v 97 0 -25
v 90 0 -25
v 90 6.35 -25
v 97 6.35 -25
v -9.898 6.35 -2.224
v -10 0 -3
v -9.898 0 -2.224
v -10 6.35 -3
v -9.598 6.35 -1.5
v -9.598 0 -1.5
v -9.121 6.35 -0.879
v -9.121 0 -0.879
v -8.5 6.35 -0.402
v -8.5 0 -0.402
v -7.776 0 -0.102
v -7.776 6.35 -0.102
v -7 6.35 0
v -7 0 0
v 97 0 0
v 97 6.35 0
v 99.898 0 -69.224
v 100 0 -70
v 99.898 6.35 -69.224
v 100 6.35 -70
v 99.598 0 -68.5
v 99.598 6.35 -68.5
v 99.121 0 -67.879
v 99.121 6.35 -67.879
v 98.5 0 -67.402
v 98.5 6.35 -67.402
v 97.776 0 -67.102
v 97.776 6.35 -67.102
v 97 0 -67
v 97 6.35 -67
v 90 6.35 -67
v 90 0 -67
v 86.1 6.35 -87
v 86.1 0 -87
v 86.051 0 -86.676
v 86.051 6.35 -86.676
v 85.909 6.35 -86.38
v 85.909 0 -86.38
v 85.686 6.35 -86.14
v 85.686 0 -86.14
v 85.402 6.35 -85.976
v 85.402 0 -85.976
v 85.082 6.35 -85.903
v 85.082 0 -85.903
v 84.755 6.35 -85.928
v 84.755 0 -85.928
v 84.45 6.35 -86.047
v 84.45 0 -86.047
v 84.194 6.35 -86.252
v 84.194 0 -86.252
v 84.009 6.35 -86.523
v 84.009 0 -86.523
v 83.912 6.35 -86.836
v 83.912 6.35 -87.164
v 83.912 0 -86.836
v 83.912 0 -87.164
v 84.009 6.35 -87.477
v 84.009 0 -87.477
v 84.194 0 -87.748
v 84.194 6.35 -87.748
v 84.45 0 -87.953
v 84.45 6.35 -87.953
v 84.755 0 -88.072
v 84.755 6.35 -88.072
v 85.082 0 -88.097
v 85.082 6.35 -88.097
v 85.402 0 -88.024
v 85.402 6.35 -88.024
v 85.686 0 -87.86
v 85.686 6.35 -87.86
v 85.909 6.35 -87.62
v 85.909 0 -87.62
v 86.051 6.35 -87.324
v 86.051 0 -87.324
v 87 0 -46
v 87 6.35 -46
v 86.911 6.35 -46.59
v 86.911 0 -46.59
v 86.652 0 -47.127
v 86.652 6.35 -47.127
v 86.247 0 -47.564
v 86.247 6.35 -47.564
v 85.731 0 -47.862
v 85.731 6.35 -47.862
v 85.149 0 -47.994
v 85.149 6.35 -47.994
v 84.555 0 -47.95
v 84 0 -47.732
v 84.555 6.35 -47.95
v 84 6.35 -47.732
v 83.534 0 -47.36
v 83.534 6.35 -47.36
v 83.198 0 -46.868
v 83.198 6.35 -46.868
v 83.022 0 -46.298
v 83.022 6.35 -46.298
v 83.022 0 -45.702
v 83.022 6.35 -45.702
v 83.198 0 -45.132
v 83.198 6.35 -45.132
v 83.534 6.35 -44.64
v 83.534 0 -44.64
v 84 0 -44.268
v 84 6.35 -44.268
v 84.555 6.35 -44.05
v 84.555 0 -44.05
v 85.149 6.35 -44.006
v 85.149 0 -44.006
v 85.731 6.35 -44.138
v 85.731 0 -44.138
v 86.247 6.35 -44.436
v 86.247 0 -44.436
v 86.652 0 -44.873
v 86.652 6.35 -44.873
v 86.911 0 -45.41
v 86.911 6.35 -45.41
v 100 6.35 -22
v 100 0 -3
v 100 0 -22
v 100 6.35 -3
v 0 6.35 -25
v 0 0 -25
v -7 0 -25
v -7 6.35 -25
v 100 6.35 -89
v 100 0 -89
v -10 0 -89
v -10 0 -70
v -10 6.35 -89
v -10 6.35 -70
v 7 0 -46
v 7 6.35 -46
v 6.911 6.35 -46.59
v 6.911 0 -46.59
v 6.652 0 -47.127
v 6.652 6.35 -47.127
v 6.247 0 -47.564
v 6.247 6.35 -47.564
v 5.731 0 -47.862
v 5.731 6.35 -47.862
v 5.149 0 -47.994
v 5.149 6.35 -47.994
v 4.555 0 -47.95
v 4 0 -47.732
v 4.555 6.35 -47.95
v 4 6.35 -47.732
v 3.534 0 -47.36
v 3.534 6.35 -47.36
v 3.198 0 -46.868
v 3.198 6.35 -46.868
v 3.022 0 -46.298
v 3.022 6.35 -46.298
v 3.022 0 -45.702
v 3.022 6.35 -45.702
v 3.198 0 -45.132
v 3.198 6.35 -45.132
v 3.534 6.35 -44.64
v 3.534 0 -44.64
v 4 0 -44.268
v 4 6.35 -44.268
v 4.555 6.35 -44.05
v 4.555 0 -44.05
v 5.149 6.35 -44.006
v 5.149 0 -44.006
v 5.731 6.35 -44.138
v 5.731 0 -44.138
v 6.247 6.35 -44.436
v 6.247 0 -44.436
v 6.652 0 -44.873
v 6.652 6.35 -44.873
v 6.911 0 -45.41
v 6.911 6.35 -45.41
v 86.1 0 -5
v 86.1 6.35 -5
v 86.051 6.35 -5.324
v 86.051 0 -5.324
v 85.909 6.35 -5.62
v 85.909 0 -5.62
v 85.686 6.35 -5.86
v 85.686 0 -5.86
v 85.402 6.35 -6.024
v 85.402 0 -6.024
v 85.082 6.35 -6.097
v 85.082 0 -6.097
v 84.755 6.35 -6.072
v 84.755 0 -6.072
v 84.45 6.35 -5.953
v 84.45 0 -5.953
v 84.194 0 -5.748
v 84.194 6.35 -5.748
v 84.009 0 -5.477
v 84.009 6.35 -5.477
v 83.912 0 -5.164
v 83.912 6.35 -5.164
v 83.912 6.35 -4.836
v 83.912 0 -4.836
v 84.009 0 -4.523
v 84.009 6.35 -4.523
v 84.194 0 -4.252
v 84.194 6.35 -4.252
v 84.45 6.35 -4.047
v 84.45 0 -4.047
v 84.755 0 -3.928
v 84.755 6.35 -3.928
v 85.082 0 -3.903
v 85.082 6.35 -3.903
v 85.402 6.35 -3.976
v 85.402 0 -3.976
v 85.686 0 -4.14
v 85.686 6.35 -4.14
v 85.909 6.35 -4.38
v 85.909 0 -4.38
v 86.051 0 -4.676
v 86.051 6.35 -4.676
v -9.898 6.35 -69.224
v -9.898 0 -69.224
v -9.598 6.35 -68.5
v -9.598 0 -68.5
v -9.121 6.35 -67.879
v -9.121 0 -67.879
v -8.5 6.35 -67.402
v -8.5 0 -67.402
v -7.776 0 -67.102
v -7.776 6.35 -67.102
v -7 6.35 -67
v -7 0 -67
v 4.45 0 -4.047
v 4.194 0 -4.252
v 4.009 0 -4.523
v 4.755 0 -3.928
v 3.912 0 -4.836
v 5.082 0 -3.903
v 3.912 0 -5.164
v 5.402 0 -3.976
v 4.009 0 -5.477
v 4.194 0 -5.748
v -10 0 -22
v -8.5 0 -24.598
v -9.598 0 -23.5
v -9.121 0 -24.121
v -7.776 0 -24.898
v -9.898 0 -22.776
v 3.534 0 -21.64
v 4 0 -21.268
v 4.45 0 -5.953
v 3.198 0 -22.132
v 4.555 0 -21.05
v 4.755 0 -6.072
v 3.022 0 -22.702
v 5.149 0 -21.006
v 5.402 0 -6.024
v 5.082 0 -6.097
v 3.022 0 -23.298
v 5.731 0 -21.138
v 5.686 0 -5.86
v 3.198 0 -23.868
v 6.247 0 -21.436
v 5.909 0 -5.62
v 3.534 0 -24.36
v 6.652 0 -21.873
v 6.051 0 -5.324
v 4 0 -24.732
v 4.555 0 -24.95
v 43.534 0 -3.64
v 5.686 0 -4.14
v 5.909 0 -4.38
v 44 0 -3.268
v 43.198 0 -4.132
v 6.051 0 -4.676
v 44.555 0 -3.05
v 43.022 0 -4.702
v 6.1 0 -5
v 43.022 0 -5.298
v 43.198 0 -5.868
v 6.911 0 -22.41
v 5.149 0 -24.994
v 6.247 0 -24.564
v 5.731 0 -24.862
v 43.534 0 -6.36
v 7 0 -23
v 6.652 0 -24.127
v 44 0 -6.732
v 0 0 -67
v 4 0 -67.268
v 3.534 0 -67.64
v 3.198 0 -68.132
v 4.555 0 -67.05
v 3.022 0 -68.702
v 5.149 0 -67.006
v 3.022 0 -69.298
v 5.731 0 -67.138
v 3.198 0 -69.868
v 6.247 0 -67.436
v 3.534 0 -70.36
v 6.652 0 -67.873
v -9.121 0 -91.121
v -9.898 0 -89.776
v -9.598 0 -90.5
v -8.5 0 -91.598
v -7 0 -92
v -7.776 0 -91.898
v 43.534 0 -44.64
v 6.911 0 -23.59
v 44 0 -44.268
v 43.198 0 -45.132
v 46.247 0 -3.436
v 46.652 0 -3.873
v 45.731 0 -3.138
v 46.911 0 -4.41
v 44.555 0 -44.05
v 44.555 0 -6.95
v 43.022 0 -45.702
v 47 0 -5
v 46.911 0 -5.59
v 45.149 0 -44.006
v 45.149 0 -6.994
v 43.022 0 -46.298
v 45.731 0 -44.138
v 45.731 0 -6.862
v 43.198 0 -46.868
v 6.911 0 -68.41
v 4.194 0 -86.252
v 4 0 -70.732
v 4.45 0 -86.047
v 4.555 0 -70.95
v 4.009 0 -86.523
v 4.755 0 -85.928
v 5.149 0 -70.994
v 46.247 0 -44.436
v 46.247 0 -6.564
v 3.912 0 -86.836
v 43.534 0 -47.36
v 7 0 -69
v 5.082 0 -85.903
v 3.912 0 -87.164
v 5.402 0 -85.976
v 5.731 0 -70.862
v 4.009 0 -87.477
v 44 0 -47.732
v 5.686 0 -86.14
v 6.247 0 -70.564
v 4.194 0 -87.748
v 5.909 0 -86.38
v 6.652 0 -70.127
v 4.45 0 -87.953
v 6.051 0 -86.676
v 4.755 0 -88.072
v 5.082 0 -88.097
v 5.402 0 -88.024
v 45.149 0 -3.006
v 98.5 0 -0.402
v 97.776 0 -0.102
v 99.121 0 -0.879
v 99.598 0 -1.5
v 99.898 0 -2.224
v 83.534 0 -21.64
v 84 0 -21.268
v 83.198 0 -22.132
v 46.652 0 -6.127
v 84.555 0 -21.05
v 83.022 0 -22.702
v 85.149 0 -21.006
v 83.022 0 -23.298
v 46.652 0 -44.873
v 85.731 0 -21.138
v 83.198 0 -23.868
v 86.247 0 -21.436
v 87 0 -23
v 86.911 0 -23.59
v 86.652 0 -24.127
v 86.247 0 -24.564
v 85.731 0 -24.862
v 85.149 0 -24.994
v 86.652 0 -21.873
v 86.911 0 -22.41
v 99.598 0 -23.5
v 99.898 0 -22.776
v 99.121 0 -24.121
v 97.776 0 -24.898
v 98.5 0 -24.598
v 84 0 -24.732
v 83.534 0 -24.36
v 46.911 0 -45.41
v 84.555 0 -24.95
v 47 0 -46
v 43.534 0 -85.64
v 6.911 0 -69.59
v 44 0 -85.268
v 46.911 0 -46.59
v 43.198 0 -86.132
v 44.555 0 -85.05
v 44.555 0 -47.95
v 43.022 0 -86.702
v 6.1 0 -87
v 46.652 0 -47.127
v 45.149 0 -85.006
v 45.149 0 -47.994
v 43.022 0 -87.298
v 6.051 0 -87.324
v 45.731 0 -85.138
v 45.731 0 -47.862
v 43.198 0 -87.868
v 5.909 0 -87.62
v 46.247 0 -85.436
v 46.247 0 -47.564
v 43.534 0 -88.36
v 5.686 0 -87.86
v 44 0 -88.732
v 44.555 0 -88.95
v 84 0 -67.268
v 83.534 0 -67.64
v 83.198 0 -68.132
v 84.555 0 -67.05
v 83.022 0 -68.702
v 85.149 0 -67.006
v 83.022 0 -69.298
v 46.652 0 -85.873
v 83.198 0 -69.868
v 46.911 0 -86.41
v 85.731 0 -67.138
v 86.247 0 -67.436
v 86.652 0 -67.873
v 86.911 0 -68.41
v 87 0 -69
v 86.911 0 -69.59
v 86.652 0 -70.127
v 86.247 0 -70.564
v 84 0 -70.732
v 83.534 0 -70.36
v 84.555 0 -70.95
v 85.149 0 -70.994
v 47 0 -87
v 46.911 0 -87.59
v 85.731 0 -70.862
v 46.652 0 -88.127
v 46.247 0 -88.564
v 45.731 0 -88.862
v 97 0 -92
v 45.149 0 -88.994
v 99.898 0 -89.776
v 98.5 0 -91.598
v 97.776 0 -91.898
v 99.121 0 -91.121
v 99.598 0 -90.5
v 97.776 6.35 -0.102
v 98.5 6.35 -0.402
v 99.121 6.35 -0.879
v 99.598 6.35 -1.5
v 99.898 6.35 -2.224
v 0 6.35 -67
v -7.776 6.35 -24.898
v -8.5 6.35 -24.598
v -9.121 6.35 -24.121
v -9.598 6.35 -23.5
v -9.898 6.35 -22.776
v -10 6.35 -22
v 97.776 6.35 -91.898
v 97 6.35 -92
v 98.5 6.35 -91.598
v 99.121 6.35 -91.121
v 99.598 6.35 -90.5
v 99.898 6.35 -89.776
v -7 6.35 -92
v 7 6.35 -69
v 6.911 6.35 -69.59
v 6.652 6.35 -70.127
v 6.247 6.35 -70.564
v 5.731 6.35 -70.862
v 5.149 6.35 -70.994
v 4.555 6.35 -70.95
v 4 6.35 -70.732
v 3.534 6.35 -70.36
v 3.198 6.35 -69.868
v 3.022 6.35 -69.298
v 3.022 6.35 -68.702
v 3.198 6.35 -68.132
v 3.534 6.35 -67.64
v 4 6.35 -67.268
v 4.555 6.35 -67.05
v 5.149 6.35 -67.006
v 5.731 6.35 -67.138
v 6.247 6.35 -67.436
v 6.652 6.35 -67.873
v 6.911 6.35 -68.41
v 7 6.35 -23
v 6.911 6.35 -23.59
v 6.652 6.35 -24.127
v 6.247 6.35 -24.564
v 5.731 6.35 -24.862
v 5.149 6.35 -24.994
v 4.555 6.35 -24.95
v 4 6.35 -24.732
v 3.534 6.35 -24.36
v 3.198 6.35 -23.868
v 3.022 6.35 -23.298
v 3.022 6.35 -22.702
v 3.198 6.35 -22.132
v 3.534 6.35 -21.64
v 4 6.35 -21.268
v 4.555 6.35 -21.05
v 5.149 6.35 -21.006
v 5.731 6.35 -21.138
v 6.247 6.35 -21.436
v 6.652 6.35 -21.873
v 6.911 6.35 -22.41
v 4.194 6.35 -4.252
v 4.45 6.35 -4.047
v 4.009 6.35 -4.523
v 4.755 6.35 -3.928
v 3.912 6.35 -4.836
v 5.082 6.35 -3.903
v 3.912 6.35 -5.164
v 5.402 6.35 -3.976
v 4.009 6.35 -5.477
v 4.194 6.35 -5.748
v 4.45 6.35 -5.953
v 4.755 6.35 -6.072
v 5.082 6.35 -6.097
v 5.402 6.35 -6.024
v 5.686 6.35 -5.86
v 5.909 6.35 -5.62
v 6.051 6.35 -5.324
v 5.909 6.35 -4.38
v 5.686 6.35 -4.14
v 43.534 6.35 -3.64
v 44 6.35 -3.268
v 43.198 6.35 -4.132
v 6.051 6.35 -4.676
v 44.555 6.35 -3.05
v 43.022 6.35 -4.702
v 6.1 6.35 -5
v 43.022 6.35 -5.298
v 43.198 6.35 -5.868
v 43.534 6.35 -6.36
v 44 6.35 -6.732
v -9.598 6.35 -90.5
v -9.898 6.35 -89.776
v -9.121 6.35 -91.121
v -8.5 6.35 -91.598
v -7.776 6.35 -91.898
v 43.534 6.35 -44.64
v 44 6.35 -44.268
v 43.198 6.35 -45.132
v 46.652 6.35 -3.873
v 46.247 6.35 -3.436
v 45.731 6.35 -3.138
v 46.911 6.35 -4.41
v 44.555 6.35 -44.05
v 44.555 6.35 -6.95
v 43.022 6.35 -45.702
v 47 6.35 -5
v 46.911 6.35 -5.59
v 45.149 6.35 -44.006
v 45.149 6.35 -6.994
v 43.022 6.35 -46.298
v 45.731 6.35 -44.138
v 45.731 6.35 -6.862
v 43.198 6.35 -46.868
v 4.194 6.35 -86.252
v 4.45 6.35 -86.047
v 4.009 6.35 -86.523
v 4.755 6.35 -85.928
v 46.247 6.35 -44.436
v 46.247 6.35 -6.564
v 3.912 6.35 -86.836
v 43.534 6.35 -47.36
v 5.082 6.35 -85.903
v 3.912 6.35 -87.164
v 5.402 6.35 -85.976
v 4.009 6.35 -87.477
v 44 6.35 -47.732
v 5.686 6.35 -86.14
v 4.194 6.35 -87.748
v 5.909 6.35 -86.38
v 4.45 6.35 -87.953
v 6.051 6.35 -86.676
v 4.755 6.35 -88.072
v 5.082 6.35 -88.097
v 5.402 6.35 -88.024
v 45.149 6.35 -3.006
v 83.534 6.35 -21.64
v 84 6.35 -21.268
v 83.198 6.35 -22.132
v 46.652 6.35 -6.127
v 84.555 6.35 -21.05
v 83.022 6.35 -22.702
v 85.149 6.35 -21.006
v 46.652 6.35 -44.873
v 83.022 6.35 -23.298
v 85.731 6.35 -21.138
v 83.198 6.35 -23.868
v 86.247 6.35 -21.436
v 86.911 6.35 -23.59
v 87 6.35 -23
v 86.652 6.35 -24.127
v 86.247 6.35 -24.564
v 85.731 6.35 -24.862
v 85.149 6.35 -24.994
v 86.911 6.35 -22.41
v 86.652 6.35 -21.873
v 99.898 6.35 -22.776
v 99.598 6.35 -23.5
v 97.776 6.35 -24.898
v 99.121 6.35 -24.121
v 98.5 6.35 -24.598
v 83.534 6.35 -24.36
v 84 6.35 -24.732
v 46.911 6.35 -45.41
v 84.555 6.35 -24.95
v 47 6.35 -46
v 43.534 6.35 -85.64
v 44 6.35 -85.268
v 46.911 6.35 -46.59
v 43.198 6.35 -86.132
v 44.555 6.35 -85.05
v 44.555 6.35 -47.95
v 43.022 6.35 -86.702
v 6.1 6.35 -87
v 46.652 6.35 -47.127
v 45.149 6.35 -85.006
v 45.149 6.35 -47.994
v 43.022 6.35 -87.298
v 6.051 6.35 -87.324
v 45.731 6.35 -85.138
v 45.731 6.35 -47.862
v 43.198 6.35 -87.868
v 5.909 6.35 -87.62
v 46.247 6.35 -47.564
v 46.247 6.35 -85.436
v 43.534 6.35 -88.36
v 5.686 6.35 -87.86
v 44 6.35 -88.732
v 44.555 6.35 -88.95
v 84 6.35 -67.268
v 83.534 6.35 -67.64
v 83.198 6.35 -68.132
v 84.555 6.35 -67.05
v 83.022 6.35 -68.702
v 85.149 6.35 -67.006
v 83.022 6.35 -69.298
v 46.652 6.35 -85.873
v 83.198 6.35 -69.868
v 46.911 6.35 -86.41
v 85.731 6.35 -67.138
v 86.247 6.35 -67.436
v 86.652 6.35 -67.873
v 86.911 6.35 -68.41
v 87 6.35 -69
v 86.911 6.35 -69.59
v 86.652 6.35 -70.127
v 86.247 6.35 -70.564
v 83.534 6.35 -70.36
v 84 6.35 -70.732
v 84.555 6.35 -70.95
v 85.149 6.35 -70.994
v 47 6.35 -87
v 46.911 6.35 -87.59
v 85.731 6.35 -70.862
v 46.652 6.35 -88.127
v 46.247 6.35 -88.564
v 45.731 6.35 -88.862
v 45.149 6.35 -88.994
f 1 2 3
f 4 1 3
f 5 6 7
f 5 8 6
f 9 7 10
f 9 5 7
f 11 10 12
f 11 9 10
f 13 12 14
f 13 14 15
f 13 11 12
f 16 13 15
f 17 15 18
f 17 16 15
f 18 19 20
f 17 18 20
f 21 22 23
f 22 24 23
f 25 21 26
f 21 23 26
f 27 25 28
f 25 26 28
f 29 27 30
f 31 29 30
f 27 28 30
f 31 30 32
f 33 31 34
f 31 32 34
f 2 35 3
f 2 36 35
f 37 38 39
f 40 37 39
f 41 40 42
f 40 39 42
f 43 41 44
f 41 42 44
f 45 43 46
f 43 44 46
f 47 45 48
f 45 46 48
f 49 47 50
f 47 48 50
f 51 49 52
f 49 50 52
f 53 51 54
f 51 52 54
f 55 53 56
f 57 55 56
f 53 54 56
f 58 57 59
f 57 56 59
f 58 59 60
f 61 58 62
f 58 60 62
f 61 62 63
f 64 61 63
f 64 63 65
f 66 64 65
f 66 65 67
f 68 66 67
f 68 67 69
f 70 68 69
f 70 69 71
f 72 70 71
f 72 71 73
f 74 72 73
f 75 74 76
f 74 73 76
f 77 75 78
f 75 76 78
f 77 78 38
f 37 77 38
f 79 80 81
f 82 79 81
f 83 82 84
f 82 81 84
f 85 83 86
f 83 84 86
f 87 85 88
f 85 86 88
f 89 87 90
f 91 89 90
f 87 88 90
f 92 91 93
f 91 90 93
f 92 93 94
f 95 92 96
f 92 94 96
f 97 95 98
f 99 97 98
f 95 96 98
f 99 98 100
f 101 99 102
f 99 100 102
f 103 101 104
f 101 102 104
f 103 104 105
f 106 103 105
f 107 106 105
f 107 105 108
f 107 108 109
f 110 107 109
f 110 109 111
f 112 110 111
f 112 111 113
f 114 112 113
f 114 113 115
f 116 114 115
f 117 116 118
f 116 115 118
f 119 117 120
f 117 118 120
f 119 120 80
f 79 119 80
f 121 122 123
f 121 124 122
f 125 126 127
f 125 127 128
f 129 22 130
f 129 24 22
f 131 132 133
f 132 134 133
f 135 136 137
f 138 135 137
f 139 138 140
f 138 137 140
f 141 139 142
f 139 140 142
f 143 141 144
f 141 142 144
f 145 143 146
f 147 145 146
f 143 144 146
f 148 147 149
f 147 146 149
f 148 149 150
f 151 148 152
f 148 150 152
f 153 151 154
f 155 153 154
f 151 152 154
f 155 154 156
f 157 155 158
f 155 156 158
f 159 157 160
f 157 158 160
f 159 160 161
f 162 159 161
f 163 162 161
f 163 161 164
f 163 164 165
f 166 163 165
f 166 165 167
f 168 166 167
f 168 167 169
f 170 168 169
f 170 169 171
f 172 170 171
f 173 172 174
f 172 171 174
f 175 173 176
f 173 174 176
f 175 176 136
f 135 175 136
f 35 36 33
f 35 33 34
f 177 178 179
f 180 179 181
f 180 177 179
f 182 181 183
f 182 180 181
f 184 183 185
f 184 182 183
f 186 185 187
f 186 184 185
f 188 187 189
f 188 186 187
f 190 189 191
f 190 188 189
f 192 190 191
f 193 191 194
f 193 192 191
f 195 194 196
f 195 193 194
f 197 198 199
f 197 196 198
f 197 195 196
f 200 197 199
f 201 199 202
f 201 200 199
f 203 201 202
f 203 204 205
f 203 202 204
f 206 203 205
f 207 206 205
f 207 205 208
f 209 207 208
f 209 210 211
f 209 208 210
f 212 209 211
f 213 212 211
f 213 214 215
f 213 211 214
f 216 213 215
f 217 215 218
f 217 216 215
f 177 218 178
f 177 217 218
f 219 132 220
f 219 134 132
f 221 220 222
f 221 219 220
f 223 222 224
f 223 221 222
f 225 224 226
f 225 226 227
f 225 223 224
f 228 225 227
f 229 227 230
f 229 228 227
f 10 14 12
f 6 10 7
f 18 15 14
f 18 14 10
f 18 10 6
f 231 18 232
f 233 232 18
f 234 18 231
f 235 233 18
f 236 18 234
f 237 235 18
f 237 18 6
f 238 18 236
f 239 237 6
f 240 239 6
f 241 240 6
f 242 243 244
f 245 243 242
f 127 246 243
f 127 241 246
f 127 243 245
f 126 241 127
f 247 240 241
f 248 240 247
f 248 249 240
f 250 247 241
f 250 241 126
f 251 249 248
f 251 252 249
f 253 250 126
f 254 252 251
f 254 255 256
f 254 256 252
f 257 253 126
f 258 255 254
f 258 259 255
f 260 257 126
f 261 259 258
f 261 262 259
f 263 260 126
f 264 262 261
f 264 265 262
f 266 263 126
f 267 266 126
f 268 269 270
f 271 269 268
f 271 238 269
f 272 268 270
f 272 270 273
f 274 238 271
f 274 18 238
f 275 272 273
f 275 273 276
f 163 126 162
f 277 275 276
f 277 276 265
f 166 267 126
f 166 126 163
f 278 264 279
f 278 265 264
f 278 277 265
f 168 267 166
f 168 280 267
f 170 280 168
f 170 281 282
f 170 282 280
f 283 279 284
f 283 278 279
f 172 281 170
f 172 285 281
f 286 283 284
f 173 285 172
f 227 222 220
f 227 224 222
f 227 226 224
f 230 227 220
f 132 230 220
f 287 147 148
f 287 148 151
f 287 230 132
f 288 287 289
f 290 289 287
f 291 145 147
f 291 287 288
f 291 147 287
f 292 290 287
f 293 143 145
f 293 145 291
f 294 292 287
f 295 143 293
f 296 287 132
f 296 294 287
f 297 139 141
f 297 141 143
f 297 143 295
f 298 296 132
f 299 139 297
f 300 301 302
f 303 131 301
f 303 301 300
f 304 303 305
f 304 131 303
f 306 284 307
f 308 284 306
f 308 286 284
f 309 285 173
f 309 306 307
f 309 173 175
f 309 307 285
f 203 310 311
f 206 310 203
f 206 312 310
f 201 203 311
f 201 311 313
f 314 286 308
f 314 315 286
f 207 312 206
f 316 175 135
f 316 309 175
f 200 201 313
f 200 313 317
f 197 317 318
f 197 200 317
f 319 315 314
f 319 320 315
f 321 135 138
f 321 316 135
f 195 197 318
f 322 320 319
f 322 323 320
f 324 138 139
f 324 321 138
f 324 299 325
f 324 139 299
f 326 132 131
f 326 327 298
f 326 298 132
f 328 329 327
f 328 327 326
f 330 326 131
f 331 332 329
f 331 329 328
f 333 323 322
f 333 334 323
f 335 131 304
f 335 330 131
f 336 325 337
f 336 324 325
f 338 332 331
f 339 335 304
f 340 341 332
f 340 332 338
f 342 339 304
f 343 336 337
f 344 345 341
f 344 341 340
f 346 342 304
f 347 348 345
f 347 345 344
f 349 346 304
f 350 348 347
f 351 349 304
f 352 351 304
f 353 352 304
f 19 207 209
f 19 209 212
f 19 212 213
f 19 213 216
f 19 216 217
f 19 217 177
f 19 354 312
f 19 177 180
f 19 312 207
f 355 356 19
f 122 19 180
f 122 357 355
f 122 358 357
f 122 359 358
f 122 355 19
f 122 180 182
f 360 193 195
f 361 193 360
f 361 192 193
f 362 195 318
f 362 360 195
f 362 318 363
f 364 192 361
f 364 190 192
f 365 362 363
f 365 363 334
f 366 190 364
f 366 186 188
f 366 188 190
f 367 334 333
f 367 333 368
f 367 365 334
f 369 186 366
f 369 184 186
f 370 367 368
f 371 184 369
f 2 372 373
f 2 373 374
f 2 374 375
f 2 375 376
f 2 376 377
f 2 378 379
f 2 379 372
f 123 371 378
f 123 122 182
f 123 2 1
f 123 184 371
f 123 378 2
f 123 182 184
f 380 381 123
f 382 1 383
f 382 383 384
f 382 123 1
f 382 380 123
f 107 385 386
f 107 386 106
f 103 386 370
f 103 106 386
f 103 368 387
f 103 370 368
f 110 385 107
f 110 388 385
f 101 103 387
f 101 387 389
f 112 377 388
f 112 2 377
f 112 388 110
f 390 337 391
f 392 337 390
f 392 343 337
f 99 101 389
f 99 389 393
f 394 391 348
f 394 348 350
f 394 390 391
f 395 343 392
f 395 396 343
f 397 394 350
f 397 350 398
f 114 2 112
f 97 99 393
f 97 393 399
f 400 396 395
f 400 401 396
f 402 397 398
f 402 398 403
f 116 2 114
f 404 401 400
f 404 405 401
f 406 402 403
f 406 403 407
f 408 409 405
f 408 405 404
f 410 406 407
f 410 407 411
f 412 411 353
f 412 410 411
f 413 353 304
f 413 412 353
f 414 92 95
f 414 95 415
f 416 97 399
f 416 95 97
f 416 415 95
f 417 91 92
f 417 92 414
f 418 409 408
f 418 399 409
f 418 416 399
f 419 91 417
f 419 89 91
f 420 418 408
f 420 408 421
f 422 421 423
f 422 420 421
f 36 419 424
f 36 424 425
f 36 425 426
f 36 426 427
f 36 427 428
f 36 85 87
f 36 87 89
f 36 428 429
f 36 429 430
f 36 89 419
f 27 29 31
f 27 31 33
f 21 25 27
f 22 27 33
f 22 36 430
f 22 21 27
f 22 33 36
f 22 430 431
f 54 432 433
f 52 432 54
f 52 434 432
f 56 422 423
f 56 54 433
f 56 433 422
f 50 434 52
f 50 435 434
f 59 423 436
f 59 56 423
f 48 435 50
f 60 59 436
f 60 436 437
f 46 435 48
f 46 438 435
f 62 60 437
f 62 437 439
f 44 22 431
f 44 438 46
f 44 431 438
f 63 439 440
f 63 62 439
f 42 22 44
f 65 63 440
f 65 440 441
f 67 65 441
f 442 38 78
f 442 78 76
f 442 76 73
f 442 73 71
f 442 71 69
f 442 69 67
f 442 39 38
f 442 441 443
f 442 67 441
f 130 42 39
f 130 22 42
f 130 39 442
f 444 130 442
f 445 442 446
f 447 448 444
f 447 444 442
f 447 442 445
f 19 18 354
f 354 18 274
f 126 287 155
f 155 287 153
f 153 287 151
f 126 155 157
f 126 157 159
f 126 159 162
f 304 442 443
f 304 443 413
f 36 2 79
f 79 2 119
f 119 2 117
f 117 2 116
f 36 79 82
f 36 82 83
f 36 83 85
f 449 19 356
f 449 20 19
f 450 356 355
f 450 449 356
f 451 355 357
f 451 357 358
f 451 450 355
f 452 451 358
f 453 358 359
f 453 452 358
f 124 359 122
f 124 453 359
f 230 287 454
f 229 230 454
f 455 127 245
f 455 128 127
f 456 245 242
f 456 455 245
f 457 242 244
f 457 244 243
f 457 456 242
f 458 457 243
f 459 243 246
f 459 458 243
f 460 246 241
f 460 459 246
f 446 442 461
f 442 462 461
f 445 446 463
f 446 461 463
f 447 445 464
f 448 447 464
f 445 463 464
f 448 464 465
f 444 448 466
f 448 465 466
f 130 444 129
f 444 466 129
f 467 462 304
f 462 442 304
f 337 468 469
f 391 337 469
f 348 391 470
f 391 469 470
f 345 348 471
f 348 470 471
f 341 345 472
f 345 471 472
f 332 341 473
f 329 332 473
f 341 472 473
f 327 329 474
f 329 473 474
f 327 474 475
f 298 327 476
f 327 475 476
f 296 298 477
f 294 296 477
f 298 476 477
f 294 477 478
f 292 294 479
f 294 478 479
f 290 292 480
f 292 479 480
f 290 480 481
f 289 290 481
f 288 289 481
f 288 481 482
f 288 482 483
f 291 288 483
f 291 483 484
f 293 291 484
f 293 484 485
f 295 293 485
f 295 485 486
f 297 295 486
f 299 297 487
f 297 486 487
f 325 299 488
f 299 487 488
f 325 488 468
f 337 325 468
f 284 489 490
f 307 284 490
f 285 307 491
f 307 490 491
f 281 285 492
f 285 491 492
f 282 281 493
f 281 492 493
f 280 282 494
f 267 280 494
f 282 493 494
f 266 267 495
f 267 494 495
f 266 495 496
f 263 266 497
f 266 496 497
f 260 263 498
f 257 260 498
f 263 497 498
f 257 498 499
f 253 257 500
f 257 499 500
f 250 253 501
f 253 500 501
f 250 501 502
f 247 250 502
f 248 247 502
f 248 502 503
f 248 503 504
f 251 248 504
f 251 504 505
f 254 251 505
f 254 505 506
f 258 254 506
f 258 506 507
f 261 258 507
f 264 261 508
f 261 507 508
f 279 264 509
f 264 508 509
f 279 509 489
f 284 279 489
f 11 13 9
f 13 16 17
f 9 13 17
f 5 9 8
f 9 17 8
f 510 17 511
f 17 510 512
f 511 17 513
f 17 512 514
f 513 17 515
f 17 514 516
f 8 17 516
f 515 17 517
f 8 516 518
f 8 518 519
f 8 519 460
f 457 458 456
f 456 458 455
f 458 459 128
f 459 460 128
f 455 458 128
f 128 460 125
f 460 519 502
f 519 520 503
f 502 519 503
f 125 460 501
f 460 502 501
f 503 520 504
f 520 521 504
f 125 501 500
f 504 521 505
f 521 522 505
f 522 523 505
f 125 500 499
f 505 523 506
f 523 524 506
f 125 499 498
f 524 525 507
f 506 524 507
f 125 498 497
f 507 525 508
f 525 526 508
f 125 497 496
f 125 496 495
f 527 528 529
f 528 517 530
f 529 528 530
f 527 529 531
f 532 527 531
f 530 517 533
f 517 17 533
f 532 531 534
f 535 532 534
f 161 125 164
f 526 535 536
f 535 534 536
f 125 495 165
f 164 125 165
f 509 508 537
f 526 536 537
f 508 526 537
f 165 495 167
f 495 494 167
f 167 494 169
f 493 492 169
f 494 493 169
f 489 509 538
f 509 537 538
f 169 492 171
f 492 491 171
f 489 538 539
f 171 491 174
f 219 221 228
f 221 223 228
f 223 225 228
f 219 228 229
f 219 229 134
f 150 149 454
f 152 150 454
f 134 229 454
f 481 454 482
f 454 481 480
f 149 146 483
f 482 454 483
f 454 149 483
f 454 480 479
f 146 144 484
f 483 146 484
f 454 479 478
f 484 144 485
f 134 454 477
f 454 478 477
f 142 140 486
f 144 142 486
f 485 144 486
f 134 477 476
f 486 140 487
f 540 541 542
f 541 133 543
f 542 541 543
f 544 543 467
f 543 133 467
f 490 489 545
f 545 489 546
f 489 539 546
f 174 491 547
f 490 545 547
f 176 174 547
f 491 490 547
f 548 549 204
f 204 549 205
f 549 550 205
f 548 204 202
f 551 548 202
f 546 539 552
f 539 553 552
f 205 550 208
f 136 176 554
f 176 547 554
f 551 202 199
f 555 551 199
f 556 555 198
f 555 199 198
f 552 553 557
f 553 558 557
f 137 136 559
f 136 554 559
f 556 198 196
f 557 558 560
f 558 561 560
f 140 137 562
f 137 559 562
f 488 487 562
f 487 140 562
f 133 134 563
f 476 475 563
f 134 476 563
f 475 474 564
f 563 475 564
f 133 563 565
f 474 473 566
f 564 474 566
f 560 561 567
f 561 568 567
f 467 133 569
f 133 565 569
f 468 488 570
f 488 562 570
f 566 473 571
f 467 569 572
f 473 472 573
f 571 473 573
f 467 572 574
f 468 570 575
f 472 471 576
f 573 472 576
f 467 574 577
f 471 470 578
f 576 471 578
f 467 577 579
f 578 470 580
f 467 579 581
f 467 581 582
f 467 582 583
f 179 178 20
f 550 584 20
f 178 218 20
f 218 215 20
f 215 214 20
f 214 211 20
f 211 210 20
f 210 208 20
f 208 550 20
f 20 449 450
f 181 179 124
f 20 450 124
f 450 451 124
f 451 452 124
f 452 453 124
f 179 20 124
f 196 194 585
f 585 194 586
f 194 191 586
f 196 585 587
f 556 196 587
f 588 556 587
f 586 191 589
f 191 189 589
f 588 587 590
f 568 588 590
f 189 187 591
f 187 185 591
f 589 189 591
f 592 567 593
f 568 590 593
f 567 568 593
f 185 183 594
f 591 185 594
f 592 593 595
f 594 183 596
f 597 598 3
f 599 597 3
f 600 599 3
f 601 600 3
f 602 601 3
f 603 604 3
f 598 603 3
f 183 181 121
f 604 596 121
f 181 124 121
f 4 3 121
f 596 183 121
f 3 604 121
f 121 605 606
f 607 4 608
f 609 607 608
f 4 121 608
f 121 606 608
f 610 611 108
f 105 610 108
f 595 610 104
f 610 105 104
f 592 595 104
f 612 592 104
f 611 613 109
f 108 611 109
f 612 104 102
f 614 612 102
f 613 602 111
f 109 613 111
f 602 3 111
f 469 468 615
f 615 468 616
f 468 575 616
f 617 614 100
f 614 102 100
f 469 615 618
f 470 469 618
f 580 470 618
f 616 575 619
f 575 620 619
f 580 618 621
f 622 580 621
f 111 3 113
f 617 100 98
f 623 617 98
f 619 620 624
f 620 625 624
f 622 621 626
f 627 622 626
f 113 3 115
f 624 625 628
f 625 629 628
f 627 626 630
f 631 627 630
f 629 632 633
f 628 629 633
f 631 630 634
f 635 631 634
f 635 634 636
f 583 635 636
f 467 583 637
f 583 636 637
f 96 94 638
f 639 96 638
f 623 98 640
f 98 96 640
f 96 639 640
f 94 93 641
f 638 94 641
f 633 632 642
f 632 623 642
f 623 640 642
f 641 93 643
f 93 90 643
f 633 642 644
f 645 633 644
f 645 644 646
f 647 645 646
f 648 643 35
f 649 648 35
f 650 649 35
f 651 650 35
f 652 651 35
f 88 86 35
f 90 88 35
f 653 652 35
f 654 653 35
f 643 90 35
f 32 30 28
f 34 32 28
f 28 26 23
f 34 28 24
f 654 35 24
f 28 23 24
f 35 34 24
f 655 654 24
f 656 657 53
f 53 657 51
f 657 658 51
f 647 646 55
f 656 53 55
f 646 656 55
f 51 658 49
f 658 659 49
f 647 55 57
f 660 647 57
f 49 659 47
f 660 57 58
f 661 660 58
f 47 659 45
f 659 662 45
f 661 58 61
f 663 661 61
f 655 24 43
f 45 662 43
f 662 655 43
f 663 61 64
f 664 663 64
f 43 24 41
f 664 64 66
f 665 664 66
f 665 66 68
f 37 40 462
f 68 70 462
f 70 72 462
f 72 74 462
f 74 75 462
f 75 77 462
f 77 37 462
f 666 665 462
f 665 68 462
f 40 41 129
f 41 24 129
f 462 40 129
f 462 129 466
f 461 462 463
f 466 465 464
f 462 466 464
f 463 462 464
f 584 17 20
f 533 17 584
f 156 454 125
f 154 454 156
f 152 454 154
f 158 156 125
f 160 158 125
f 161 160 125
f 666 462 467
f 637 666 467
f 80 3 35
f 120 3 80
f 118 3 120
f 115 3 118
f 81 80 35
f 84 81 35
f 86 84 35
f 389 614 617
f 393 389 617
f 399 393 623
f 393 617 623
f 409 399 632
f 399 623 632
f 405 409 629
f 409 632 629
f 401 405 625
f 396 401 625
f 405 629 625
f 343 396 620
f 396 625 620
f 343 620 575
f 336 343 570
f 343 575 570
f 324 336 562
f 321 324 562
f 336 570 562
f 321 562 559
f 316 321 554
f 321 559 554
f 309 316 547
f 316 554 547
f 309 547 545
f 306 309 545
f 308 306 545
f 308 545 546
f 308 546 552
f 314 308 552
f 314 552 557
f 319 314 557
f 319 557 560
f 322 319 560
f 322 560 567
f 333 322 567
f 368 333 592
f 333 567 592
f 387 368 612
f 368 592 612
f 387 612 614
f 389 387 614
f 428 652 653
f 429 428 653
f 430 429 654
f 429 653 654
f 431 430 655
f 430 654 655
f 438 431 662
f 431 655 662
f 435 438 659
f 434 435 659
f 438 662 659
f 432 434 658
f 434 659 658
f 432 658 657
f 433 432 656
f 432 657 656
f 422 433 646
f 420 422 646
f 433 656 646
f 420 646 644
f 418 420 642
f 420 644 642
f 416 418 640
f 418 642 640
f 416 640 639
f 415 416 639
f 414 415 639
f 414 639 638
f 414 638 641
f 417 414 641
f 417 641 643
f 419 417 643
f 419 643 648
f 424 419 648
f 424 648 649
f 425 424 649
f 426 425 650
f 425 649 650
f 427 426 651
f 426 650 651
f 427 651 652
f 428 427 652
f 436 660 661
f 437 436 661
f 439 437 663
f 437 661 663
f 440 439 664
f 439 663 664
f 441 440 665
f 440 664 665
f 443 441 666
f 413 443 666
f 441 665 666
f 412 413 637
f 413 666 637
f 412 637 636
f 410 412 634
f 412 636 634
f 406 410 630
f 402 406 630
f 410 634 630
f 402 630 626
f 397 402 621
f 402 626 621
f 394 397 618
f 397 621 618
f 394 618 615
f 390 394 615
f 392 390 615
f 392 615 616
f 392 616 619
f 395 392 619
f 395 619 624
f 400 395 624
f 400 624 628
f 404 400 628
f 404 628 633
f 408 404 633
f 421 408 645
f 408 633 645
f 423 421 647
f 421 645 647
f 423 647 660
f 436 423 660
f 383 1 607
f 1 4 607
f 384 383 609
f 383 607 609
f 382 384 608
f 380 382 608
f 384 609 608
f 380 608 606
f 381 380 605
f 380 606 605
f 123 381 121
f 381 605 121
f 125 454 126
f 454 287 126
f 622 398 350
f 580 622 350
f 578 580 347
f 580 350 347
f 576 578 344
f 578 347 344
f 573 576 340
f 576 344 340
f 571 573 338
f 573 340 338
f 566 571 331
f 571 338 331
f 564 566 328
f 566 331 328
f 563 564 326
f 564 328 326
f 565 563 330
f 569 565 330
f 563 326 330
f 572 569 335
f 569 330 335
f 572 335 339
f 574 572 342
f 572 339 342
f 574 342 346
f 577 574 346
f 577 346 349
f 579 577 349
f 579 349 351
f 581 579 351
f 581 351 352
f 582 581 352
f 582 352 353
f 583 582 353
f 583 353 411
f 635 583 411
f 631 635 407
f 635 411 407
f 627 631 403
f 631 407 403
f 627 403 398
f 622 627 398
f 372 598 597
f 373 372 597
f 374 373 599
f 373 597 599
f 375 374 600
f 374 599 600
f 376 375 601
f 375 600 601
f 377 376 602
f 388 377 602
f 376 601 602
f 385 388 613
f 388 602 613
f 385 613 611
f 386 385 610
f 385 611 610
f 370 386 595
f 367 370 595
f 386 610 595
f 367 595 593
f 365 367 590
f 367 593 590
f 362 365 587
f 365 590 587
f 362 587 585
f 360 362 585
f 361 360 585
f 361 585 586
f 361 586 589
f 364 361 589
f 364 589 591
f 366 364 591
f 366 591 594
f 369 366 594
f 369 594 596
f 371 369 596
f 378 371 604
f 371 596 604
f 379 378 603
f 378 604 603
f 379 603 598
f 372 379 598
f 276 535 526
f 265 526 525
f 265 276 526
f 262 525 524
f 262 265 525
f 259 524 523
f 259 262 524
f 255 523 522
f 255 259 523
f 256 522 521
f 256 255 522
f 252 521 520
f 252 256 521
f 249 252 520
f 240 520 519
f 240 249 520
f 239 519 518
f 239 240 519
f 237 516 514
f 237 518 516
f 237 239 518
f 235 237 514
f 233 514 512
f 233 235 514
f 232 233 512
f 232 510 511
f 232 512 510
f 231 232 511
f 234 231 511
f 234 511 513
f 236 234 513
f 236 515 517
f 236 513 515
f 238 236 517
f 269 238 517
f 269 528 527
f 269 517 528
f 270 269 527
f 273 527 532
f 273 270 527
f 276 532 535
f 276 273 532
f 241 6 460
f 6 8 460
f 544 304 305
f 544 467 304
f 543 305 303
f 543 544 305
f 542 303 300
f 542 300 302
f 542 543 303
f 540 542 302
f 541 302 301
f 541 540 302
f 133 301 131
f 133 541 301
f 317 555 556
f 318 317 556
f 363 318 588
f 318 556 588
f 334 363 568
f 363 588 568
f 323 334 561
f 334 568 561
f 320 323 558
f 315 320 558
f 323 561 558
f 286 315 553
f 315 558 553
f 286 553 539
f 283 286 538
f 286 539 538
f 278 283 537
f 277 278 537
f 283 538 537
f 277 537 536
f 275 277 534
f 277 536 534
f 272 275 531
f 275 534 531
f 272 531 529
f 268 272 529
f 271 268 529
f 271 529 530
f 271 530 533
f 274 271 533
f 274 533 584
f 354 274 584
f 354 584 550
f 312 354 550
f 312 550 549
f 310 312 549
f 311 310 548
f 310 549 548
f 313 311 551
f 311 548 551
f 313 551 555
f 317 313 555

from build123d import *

# Parameters (mm, degrees)
SKETCH1_W               = 90
SKETCH1_H               = 46
SKETCH1_R               = 1.1
BOSS_EXTRUDE1_DEPTH     = 6.35
SKETCH2_W               = 25
SKETCH2_H               = 6.35
BOSS_EXTRUDE2_DEPTH     = 10
FILLET1_R               = 3
MIRROR2_COPY_1_SKETCH_W = 90
MIRROR2_COPY_1_SKETCH_H = 46
MIRROR2_COPY_1_SKETCH_R = 1.1
MIRROR2_COPY_1_DEPTH    = 6.35
FILLET1_OF_MIRROR2_R    = 3
SKETCH3_R               = 2
CUT_EXTRUDE1_DEPTH      = 6.35
SKETCH4_R               = 2
CUT_EXTRUDE2_DEPTH      = 6.35
SKETCH5_R               = 2
CUT_EXTRUDE3_DEPTH      = 6.35
SKETCH6_R               = 2
CUT_EXTRUDE4_DEPTH      = 6.35


with BuildPart() as part:
    # Sketch1 → Boss-Extrude1 (new body)
    with BuildSketch(Plane(origin=(0, 0, 0), x_dir=(1, 0, 0), z_dir=(0, 1, 0))):
        with Locations((45, 23)):
            Rectangle(SKETCH1_W, SKETCH1_H)
        with Locations((85, 5)):
            Circle(SKETCH1_R, mode=Mode.SUBTRACT)
        with Locations((5, 5)):
            Circle(SKETCH1_R, mode=Mode.SUBTRACT)
    boss_extrude1 = extrude(amount=BOSS_EXTRUDE1_DEPTH)

    # Mirror1: Boss-Extrude1 across plane
    add(boss_extrude1.mirror(Plane(origin=(0, 0, -46), x_dir=(1, 0, 0), z_dir=(0, 0, -1))))

    # Sketch2 → Boss-Extrude2 (add)
    with BuildSketch(Plane(origin=(90, 0, 0), x_dir=(0, 0, -1), z_dir=(1, 0, 0))):
        with Locations((12.5, 3.175)):
            Rectangle(SKETCH2_W, SKETCH2_H)
        with Locations((79.5, 3.175)):
            Rectangle(SKETCH2_W, SKETCH2_H)
    boss_extrude2 = extrude(amount=BOSS_EXTRUDE2_DEPTH)

    # Fillet1
    fillet1_edges = [part.edges().sort_by_distance(p)[0] for p in [
        (100, 3.175, 0),
        (100, 3.175, -25),
        (100, 3.175, -92),
        (100, 3.175, -67),
    ]]
    fillet(fillet1_edges, radius=FILLET1_R)

    # Mirror2: Boss-Extrude1, Boss-Extrude2 across plane
    add(boss_extrude1.mirror(Plane(origin=(45, 0, 0), x_dir=(0, 0, 1), z_dir=(1, 0, 0))))
    add(boss_extrude2.mirror(Plane(origin=(45, 0, 0), x_dir=(0, 0, 1), z_dir=(1, 0, 0))))

    # Mirror2 copy 1 sketch → Mirror2 copy 1 (add)
    with BuildSketch(Plane(origin=(90, 0, -92), x_dir=(-1, 0, 0), z_dir=(0, 1, 0))):
        with Locations((45, 23)):
            Rectangle(MIRROR2_COPY_1_SKETCH_W, MIRROR2_COPY_1_SKETCH_H)
        with Locations((85, 5)):
            Circle(MIRROR2_COPY_1_SKETCH_R, mode=Mode.SUBTRACT)
        with Locations((5, 5)):
            Circle(MIRROR2_COPY_1_SKETCH_R, mode=Mode.SUBTRACT)
    extrude(amount=MIRROR2_COPY_1_DEPTH)

    # Fillet1 of Mirror2
    fillet1_of_mirror2_edges = [part.edges().sort_by_distance(p)[0] for p in [
        (-10, 3.175, 0),
        (-10, 3.175, -25),
        (-10, 3.175, -92),
        (-10, 3.175, -67),
    ]]
    fillet(fillet1_of_mirror2_edges, radius=FILLET1_OF_MIRROR2_R)

    # Sketch3 → Cut-Extrude1 (cut)
    with BuildSketch(Plane(origin=(0, 6.35, 0), x_dir=(1, 0, 0), z_dir=(0, 1, 0))):
        with Locations((5, 69)):
            Circle(SKETCH3_R)
        with Locations((85, 69)):
            Circle(SKETCH3_R)
    extrude(amount=-CUT_EXTRUDE1_DEPTH, mode=Mode.SUBTRACT)

    # Sketch4 → Cut-Extrude2 (cut)
    with BuildSketch(Plane(origin=(0, 6.35, 0), x_dir=(1, 0, 0), z_dir=(0, 1, 0))):
        with Locations((5, 23)):
            Circle(SKETCH4_R)
        with Locations((85, 23)):
            Circle(SKETCH4_R)
    extrude(amount=-CUT_EXTRUDE2_DEPTH, mode=Mode.SUBTRACT)

    # Sketch5 → Cut-Extrude3 (cut)
    with BuildSketch(Plane(origin=(0, 6.35, 0), x_dir=(1, 0, 0), z_dir=(0, 1, 0))):
        with Locations((45, 5)):
            Circle(SKETCH5_R)
        with Locations((45, 87)):
            Circle(SKETCH5_R)
    extrude(amount=-CUT_EXTRUDE3_DEPTH, mode=Mode.SUBTRACT)

    # Sketch6 → Cut-Extrude4 (cut)
    with BuildSketch(Plane(origin=(0, 6.35, 0), x_dir=(1, 0, 0), z_dir=(0, 1, 0))):
        with Locations((85, 46)):
            Circle(SKETCH6_R)
        with Locations((45, 46)):
            Circle(SKETCH6_R)
        with Locations((5, 46)):
            Circle(SKETCH6_R)
    extrude(amount=-CUT_EXTRUDE4_DEPTH, mode=Mode.SUBTRACT)


solid = part.part
